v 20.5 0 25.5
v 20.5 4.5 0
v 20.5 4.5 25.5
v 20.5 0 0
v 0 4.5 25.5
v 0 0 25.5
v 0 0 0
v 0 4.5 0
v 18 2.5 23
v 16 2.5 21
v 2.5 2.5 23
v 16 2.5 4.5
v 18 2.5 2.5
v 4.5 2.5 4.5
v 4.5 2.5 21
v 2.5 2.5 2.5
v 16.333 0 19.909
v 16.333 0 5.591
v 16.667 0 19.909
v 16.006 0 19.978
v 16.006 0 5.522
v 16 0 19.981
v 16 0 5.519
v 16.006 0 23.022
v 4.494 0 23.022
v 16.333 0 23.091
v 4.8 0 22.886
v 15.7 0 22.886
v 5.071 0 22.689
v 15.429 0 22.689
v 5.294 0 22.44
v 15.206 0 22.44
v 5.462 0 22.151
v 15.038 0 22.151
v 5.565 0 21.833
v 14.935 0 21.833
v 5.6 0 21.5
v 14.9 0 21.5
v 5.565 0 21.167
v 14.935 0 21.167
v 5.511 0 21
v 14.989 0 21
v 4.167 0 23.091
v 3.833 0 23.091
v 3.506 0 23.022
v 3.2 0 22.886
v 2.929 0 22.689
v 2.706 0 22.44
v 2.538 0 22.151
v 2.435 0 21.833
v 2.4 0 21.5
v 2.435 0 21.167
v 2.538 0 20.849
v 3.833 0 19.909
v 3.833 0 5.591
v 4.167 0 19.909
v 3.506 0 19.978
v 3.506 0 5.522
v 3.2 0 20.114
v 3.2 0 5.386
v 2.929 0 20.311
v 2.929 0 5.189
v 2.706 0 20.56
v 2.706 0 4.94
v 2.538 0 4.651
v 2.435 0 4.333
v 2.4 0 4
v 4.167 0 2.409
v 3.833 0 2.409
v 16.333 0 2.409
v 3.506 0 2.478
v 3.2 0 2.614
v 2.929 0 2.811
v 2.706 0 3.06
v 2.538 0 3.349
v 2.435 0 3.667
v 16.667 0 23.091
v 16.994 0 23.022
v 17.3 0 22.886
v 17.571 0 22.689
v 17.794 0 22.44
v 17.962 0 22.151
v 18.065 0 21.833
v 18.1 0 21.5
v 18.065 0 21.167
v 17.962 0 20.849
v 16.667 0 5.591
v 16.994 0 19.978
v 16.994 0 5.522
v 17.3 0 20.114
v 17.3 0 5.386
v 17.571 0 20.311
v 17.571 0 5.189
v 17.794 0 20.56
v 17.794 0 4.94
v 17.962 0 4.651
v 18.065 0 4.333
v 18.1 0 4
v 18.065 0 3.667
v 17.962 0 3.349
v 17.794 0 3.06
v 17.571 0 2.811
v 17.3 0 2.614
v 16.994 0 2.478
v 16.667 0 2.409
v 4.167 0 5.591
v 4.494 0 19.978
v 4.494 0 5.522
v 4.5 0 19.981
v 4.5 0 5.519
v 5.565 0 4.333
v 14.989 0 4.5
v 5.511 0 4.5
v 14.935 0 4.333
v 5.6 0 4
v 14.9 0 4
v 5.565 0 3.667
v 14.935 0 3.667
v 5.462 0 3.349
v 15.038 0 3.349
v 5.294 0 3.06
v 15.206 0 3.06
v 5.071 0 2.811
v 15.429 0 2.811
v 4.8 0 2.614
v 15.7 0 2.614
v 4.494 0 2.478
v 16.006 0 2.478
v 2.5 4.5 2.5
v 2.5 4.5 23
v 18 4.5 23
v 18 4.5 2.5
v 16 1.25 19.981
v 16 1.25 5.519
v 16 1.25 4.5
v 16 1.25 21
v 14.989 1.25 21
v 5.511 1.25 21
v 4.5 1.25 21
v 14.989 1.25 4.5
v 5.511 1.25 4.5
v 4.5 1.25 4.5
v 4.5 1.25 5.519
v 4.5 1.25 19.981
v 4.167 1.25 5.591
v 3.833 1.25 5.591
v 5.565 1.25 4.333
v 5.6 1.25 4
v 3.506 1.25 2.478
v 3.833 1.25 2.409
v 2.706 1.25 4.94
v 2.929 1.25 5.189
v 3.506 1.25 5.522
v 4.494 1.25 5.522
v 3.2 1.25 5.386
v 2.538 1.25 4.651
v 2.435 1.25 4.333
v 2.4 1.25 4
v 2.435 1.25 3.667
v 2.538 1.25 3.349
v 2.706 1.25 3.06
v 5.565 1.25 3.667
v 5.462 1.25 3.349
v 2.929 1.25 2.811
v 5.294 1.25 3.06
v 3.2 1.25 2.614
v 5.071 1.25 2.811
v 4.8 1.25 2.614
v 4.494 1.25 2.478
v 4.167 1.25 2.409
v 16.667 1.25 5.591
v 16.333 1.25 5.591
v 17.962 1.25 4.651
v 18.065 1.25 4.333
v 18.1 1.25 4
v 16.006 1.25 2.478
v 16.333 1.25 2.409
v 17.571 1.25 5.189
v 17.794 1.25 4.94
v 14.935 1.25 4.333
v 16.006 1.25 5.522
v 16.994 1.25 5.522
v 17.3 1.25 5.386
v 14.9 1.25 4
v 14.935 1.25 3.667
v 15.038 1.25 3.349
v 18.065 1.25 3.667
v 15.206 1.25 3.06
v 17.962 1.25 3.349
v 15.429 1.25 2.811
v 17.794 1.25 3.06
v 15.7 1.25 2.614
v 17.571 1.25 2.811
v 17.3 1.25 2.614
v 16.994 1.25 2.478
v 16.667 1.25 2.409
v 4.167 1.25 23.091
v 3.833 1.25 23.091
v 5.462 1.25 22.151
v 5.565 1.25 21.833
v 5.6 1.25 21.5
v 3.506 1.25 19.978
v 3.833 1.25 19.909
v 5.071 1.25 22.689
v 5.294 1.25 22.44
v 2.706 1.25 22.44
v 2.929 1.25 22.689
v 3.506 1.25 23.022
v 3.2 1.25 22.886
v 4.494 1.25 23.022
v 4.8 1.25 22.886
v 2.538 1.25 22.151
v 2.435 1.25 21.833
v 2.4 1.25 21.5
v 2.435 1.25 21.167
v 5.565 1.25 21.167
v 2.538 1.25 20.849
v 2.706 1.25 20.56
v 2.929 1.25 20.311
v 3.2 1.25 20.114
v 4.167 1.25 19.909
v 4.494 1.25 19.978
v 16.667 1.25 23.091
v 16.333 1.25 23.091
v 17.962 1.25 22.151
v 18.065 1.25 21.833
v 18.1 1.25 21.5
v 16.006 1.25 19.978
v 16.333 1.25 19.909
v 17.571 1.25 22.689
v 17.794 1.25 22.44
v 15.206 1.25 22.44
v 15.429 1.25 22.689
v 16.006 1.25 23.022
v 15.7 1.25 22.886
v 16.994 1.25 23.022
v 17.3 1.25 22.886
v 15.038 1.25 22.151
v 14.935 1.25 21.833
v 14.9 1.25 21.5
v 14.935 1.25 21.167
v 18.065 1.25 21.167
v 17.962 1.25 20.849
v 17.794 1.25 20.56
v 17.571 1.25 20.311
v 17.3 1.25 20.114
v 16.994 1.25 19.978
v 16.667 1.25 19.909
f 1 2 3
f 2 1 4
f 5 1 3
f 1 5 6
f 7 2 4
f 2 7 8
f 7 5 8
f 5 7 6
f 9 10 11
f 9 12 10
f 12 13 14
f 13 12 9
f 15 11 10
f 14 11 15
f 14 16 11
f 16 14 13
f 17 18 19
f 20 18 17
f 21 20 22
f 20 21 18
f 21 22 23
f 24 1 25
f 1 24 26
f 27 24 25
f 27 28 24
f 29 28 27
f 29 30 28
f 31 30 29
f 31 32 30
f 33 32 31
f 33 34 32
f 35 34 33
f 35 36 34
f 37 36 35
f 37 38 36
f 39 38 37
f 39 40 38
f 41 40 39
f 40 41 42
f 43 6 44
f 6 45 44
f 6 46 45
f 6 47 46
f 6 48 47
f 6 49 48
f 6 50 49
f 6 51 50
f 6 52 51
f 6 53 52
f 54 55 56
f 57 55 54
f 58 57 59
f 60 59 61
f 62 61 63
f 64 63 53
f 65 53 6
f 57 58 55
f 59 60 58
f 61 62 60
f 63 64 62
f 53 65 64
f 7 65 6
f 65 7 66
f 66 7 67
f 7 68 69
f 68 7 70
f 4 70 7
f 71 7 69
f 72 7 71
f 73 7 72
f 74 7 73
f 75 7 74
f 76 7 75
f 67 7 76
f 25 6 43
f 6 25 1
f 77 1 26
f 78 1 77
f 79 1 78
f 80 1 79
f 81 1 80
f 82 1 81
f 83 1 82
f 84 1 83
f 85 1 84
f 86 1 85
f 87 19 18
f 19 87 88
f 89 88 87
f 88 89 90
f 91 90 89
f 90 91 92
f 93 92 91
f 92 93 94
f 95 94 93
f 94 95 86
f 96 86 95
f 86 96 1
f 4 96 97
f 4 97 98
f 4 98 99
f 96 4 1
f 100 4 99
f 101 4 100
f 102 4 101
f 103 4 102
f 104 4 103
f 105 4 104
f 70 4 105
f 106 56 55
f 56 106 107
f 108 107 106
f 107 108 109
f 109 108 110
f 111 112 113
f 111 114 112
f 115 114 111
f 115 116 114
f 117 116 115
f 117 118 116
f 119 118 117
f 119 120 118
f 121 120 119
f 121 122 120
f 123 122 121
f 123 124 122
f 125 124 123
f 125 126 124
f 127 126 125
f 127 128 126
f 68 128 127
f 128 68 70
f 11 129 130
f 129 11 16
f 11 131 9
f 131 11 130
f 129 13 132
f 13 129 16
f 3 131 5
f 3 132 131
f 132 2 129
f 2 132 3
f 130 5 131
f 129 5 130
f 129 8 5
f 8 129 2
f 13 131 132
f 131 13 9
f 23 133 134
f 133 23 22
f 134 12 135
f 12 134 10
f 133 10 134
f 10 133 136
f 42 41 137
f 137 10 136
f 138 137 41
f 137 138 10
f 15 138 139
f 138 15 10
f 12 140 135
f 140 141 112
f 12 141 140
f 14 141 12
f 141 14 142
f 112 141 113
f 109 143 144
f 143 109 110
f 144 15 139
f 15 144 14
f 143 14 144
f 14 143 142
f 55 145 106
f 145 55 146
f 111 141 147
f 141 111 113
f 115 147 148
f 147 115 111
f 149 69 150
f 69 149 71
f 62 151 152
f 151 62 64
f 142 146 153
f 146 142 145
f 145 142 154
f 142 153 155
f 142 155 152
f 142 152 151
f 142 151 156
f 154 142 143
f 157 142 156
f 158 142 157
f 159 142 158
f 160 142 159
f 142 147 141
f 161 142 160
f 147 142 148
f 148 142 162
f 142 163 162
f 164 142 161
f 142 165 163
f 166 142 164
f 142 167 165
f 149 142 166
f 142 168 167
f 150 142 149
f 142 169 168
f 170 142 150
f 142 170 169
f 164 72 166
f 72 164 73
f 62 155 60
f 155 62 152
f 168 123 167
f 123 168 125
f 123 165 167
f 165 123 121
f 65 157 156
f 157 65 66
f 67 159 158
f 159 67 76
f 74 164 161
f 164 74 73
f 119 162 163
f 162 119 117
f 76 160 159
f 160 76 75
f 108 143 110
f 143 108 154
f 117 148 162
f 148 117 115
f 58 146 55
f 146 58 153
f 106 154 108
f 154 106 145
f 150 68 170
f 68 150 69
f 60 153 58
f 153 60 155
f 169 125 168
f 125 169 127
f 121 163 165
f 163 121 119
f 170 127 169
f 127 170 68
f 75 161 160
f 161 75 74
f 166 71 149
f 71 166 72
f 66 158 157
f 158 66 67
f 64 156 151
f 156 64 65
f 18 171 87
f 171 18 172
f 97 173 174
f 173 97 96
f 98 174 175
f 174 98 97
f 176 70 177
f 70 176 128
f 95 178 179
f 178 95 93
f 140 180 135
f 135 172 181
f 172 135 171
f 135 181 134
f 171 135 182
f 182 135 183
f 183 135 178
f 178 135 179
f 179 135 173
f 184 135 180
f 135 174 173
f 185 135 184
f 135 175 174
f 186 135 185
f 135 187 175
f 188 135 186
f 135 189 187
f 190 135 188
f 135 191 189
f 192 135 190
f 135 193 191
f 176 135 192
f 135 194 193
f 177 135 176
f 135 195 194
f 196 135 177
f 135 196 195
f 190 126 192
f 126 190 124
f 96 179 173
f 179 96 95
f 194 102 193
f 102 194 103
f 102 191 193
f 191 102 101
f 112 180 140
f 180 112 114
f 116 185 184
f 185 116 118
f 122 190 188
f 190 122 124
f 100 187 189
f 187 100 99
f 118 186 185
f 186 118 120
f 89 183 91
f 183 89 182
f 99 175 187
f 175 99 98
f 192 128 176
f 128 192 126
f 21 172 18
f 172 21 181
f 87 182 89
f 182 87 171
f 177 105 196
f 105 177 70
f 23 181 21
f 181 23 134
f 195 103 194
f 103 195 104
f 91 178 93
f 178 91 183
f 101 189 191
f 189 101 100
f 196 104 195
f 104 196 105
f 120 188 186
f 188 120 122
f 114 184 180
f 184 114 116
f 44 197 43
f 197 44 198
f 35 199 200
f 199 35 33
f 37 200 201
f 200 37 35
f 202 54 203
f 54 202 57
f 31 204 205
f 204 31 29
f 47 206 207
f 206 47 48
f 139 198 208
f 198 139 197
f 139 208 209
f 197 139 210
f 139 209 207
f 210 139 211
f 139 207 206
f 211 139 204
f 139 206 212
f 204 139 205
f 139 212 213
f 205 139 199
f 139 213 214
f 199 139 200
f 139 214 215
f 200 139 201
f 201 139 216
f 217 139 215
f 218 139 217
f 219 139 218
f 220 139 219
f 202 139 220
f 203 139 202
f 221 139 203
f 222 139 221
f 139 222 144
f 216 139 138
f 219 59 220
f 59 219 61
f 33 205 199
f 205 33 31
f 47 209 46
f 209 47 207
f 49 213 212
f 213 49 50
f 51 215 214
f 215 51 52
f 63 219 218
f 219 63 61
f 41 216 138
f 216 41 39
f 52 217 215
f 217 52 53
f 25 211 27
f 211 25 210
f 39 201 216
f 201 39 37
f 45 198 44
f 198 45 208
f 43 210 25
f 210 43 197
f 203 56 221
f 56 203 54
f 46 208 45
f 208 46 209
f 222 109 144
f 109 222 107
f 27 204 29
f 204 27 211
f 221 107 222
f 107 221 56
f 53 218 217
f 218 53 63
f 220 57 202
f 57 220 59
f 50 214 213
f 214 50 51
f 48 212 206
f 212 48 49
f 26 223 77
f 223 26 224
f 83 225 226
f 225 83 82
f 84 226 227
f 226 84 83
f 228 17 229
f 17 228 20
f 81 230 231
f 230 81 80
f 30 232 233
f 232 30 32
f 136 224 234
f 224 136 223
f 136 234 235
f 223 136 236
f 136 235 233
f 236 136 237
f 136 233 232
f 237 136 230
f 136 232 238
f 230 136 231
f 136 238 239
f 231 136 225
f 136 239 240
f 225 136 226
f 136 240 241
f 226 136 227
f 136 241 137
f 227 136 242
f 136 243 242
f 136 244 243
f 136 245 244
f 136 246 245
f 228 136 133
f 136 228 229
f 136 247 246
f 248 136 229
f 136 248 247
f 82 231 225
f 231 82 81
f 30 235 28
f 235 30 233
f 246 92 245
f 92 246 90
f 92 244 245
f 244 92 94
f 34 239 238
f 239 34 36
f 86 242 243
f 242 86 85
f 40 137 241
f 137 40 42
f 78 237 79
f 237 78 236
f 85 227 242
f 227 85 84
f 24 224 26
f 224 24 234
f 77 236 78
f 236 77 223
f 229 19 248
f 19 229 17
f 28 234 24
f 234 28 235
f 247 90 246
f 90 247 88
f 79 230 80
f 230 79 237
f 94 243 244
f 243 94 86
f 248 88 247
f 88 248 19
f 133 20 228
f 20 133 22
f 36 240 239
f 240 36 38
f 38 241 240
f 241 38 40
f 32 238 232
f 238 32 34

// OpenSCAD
// ============================================================
// AquaFlow — APDS-9960 Gesture Sensor Wall-Mount Bracket
// ============================================================
// The APDS-9960 board is 15.5mm wide x 20.5mm tall.
// This bracket clips it flush against the back wall of the
// dispenser, facing outward into the cup bay.
//
// HOW TO USE:
//   Press F5 to preview. Press F6 to fully render.
//   File → Export → Export as STL when done.
// ============================================================


// --- Board Dimensions (do not change) ---
board_w   = 15.5;   // APDS board width  (mm)
board_h   = 20.5;   // APDS board height (mm)
board_thk = 1.6;    // standard PCB thickness

// --- Bracket Parameters (adjust to taste) ---
wall_thk   = 2.5;   // bracket wall thickness
lip_depth  = 2.0;   // how far the lip grips the board edge
lip_height = 3.0;   // height of the retaining lips

// --- Mounting screw holes (M3) ---
screw_d    = 3.2;   // M3 clearance hole
screw_head = 6.0;   // M3 countersink diameter
screw_off  = 4.0;   // distance from corner to screw centre

// --- Derived outer dimensions ---
outer_w = board_w + (wall_thk * 2);
outer_h = board_h + (wall_thk * 2);

// ============================================================
// Main bracket body
// ============================================================
difference() {
    union() {
        // Base plate (the part that screws to the back wall)
        cube([outer_w, wall_thk, outer_h]);

        // Left retaining lip (grips left edge of PCB)
        translate([0, wall_thk, wall_thk])
            cube([wall_thk, lip_depth, board_h]);

        // Right retaining lip (grips right edge of PCB)
        translate([outer_w - wall_thk, wall_thk, wall_thk])
            cube([wall_thk, lip_depth, board_h]);

        // Bottom retaining lip (keeps board from sliding down)
        translate([0, wall_thk, 0])
            cube([outer_w, lip_depth, wall_thk]);

        // Top retaining lip (locks board in completely)
        translate([0, wall_thk, outer_h - wall_thk])
            cube([outer_w, lip_depth, wall_thk]);
    }

    // --- Sensor window: hollow cutout so the sensor faces forward ---
    // Slightly smaller than the board so the sensor chip peeks through
    translate([wall_thk + 2, -1, wall_thk + 2])
        cube([board_w - 4, wall_thk + 2, board_h - 4]);

    // --- Mounting screw holes in the base plate ---
    // Bottom-left
    translate([screw_off, wall_thk / 2, screw_off])
        rotate([90, 0, 0]) cylinder(d = screw_d, h = wall_thk + 1, $fn = 30);

    // Bottom-right
    translate([outer_w - screw_off, wall_thk / 2, screw_off])
        rotate([90, 0, 0]) cylinder(d = screw_d, h = wall_thk + 1, $fn = 30);

    // Top-left
    translate([screw_off, wall_thk / 2, outer_h - screw_off])
        rotate([90, 0, 0]) cylinder(d = screw_d, h = wall_thk + 1, $fn = 30);

    // Top-right
    translate([outer_w - screw_off, wall_thk / 2, outer_h - screw_off])
        rotate([90, 0, 0]) cylinder(d = screw_d, h = wall_thk + 1, $fn = 30);
}
